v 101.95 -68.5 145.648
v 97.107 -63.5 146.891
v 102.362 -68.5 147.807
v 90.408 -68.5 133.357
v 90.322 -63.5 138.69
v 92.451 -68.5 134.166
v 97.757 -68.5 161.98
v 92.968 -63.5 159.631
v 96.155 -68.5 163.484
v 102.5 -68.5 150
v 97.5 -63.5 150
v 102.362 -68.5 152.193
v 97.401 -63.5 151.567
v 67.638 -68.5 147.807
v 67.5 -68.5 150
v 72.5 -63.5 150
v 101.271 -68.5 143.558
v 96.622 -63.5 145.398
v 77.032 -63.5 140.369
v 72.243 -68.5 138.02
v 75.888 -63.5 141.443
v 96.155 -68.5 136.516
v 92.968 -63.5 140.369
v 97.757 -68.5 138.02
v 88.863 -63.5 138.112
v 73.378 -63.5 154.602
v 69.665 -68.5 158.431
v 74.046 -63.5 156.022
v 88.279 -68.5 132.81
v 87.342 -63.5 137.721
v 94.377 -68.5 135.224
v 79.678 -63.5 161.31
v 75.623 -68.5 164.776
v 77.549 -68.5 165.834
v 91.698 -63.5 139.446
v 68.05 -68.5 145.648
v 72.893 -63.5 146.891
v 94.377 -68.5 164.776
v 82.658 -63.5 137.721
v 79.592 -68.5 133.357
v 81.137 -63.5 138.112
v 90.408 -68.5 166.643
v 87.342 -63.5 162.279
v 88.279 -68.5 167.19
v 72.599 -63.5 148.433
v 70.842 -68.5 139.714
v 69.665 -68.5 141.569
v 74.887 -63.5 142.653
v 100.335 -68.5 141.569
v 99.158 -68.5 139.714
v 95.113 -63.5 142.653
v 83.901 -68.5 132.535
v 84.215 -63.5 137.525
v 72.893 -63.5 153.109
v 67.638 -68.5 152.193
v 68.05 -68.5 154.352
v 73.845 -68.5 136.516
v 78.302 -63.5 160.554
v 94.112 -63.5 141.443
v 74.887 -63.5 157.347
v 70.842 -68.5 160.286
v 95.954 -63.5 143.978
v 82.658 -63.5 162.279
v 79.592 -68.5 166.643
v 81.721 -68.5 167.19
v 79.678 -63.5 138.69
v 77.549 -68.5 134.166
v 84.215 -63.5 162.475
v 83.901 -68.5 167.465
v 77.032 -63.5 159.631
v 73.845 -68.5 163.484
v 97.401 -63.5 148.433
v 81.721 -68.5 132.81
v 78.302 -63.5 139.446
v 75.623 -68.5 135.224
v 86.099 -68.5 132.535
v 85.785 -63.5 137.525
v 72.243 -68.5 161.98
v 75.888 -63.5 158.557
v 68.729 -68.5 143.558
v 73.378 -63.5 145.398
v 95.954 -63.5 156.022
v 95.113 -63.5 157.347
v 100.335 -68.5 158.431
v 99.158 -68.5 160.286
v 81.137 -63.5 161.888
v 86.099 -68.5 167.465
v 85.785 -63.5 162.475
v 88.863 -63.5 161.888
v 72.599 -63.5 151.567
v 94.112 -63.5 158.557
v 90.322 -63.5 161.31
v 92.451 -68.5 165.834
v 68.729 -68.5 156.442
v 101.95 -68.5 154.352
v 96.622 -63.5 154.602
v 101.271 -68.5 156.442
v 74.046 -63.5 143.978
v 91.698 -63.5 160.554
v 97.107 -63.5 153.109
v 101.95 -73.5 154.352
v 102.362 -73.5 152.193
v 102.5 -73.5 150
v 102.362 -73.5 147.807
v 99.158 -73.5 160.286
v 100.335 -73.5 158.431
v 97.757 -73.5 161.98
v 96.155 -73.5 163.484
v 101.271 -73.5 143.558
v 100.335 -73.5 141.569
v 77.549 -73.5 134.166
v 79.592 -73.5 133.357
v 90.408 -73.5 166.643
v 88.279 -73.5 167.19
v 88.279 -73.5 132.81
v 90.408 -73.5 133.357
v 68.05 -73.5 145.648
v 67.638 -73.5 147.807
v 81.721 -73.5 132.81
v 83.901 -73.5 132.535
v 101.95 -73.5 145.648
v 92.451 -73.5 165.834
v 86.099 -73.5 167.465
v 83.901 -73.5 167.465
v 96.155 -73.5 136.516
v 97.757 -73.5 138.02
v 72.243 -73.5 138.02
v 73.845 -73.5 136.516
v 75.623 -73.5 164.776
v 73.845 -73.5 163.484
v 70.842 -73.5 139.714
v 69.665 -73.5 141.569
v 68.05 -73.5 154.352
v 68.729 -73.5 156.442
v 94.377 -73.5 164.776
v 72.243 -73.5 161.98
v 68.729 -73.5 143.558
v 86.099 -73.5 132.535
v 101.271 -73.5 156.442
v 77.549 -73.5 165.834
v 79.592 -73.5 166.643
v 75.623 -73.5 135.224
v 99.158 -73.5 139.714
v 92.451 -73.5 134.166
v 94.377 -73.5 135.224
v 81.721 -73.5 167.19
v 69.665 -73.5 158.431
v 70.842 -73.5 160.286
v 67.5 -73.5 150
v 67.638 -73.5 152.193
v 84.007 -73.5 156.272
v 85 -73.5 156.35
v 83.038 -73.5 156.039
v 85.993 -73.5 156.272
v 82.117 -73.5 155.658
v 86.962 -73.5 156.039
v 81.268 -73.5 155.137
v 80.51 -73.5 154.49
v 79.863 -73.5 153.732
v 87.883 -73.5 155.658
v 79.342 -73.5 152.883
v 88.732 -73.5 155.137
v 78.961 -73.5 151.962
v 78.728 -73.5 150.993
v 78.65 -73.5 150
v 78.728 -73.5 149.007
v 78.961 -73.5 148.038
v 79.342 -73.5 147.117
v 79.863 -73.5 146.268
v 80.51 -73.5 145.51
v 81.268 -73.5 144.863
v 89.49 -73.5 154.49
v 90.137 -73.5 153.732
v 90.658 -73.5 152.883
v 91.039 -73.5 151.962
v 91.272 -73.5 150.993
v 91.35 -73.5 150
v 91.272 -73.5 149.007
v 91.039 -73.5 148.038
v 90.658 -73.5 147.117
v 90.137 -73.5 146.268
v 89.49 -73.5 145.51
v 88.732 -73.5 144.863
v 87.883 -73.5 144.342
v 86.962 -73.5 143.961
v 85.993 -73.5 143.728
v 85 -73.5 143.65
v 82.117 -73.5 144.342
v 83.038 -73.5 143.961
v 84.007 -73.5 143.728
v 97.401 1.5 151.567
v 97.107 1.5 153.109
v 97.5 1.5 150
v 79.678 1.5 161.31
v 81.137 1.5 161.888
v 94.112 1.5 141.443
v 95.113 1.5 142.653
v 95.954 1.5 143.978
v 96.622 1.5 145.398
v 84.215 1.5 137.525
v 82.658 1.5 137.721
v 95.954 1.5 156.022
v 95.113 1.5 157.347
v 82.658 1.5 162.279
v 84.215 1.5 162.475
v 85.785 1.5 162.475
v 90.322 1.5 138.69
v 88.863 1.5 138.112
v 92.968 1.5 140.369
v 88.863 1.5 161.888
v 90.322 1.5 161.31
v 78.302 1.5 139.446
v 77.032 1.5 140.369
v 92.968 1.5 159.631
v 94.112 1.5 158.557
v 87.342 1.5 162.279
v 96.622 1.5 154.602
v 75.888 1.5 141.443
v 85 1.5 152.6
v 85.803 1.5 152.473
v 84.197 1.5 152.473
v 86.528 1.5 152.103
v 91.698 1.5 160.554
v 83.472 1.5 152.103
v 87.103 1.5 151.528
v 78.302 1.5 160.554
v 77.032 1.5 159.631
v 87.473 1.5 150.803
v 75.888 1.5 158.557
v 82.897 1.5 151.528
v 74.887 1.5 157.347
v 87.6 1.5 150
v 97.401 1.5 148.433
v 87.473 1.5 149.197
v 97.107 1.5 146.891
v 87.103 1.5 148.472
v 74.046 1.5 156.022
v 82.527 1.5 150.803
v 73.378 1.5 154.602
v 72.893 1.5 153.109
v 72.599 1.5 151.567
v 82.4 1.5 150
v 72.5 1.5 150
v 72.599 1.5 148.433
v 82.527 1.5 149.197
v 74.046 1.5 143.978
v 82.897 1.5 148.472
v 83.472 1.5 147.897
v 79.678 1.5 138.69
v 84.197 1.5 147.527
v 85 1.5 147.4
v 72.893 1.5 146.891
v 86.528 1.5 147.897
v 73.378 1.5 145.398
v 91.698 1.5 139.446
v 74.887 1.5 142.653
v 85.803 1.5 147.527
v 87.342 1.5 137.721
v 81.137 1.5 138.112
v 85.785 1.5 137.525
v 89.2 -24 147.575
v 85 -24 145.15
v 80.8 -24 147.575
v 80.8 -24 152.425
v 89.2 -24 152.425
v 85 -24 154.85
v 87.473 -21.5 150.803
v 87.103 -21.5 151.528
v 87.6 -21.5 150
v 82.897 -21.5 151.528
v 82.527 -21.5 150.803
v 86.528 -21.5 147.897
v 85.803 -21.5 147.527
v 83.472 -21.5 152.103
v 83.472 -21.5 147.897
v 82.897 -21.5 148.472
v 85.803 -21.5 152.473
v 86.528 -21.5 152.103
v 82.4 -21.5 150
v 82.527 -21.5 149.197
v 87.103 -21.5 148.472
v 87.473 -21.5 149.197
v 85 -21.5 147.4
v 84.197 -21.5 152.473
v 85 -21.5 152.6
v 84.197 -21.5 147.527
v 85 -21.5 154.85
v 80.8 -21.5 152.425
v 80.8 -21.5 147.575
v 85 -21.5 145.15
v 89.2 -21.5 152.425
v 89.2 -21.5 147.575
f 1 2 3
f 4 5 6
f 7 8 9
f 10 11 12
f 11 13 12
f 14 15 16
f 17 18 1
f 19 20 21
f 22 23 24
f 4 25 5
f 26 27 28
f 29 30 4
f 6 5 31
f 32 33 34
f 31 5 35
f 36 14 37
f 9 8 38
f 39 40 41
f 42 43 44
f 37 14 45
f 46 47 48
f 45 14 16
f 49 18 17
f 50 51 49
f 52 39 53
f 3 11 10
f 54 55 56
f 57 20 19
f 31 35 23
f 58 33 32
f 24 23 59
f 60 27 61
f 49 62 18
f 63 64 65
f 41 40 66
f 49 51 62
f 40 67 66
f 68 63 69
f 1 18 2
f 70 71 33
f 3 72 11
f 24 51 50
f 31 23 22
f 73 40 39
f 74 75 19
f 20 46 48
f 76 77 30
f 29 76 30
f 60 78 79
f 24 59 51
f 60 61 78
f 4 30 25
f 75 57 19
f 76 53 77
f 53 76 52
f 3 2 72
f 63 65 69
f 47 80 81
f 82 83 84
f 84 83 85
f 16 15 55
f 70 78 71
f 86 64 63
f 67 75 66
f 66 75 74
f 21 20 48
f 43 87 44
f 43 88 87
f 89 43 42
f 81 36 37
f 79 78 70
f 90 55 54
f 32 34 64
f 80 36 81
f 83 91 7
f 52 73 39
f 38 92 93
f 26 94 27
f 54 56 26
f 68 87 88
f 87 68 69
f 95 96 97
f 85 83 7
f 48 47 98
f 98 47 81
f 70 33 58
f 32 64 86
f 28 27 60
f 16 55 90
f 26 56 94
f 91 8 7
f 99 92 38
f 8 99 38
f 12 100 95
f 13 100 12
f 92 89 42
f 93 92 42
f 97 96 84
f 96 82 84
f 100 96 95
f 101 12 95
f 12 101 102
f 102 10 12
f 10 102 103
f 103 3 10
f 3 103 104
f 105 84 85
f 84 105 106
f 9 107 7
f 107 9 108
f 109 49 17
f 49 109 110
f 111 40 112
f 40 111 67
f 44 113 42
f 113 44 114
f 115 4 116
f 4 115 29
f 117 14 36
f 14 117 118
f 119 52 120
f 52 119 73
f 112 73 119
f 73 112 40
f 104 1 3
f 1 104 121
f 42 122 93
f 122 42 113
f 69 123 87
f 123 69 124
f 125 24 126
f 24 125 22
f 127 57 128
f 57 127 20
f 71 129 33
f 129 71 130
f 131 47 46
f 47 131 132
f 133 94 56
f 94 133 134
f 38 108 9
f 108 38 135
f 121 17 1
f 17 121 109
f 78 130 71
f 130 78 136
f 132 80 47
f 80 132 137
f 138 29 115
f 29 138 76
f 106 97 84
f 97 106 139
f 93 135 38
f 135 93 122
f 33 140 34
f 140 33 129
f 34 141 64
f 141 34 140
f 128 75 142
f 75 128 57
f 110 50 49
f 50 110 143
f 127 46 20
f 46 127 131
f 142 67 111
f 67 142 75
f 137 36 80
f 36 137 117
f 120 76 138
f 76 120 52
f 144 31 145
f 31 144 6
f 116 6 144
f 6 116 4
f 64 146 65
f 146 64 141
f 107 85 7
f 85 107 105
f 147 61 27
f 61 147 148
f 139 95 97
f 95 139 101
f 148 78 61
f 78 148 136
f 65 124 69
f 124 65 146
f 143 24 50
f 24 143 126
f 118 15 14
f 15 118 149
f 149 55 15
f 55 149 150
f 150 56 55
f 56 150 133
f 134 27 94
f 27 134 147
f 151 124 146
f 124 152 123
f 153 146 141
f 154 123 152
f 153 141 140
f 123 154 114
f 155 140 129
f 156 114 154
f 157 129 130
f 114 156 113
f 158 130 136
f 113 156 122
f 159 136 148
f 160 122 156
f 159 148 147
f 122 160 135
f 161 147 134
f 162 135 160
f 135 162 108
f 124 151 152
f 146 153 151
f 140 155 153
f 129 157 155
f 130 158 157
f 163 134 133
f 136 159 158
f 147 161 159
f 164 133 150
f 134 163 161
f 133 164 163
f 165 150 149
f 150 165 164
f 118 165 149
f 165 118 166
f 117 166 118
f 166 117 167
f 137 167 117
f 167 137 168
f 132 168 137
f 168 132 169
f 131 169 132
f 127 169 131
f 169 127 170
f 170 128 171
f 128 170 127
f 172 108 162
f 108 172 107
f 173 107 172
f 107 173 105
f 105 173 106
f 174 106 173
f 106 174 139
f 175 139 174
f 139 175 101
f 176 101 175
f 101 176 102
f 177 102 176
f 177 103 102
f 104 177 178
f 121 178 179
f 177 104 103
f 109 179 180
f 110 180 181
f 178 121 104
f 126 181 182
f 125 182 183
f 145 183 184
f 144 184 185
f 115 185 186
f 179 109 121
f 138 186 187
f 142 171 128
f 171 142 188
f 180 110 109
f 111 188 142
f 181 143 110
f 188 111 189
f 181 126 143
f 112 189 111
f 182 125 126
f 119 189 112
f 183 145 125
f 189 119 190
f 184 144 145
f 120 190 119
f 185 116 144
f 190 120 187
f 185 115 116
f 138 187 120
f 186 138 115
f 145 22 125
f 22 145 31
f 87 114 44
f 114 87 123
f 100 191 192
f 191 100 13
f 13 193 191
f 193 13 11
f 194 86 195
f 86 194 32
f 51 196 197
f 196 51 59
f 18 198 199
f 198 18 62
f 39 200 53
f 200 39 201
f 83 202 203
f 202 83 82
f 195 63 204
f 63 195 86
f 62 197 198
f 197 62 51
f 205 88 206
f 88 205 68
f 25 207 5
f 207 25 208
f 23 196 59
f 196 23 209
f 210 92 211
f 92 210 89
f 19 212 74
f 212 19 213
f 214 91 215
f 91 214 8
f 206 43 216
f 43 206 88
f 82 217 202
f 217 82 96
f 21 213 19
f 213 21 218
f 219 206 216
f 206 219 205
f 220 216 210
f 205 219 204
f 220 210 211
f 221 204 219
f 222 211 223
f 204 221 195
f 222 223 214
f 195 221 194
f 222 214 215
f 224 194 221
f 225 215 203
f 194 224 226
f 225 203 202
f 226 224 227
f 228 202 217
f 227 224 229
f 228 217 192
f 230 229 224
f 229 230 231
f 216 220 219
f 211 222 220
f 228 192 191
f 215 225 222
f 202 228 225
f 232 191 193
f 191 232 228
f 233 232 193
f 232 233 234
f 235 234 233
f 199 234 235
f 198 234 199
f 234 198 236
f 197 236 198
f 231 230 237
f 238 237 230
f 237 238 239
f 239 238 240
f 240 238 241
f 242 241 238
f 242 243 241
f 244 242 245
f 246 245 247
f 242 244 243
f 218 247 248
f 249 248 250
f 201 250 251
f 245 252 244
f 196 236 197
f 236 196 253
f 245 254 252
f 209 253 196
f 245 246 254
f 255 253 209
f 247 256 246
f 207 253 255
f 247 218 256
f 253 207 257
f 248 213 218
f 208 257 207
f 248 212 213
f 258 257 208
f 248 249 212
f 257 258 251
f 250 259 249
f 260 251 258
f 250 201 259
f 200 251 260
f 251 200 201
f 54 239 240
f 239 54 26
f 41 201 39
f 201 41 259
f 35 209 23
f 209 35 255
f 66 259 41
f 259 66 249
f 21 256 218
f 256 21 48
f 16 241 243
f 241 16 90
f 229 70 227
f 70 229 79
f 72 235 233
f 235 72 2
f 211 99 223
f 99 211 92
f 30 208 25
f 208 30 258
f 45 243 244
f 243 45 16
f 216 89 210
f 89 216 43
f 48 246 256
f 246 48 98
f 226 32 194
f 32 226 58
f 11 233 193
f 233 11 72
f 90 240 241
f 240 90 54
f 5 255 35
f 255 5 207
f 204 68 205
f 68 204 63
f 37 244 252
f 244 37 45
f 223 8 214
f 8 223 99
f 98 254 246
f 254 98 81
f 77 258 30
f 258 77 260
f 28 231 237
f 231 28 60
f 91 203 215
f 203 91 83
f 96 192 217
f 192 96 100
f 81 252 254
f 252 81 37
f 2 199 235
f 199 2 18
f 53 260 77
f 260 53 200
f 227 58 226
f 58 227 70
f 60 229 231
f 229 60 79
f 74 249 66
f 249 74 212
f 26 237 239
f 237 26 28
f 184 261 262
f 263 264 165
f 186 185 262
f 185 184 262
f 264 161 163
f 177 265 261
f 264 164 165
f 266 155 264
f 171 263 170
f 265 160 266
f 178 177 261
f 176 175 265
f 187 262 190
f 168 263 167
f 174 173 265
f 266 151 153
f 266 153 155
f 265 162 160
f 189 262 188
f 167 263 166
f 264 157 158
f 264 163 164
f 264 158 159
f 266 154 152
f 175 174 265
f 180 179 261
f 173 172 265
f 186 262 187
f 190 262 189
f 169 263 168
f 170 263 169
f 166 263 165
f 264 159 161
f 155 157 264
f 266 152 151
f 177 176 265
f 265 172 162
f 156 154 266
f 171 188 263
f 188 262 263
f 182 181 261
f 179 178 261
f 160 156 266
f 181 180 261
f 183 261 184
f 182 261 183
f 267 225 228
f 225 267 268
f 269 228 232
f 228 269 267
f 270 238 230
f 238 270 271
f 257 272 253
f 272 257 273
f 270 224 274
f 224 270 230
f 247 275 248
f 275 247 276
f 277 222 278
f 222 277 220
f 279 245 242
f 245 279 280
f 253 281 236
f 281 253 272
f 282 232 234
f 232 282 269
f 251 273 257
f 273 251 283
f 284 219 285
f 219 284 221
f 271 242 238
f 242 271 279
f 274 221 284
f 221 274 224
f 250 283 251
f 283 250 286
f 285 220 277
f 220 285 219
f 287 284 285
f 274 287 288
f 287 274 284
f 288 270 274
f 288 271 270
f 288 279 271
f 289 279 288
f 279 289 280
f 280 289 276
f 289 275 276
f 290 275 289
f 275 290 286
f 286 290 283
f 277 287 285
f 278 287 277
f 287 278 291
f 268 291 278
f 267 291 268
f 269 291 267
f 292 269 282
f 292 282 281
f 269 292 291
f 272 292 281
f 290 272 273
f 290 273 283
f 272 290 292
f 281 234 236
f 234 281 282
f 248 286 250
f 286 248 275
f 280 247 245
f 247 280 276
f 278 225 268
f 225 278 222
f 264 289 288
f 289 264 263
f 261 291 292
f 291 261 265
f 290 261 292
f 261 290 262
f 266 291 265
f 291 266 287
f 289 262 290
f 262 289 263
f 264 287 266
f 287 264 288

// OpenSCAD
include <spool_holder.scad>;
use <spool_holder.scad>;


SPOOL_MOUNT_HW = M5;
SPOOL_MOUNT_HW_LEN = 49;
CONN_BOLT_LEN = 49;

BOLT_SIZE=M5;

difference(){
    union(){
            // jaw model (lower part)
            *translate([0,ARM_BASE_W,0]) base(display_jaw=true);
            // base model(upper part)
            *translate([0,ARM_BASE_W,0]) base(display_base=true);
            // arm model
            *arm(
                dual_spool=false,
                display="arm",
                spool_bolt_size=SPOOL_MOUNT_HW,
                spool_bolt_len=SPOOL_MOUNT_HW_LEN);
            // spool model
            arm(
                dual_spool=false,
                display="single_spool",
                spool_bolt_size=SPOOL_MOUNT_HW,
                spool_bolt_len=SPOOL_MOUNT_HW_LEN);
        }
    //using joining hardware
    for (i=[10, 30]){
        translate([10, 0, i])
            rotate([270, 30, 0])
                bolt_nut(CONN_BOLT_LEN , BOLT_SIZE, flip=false);
    }
}
